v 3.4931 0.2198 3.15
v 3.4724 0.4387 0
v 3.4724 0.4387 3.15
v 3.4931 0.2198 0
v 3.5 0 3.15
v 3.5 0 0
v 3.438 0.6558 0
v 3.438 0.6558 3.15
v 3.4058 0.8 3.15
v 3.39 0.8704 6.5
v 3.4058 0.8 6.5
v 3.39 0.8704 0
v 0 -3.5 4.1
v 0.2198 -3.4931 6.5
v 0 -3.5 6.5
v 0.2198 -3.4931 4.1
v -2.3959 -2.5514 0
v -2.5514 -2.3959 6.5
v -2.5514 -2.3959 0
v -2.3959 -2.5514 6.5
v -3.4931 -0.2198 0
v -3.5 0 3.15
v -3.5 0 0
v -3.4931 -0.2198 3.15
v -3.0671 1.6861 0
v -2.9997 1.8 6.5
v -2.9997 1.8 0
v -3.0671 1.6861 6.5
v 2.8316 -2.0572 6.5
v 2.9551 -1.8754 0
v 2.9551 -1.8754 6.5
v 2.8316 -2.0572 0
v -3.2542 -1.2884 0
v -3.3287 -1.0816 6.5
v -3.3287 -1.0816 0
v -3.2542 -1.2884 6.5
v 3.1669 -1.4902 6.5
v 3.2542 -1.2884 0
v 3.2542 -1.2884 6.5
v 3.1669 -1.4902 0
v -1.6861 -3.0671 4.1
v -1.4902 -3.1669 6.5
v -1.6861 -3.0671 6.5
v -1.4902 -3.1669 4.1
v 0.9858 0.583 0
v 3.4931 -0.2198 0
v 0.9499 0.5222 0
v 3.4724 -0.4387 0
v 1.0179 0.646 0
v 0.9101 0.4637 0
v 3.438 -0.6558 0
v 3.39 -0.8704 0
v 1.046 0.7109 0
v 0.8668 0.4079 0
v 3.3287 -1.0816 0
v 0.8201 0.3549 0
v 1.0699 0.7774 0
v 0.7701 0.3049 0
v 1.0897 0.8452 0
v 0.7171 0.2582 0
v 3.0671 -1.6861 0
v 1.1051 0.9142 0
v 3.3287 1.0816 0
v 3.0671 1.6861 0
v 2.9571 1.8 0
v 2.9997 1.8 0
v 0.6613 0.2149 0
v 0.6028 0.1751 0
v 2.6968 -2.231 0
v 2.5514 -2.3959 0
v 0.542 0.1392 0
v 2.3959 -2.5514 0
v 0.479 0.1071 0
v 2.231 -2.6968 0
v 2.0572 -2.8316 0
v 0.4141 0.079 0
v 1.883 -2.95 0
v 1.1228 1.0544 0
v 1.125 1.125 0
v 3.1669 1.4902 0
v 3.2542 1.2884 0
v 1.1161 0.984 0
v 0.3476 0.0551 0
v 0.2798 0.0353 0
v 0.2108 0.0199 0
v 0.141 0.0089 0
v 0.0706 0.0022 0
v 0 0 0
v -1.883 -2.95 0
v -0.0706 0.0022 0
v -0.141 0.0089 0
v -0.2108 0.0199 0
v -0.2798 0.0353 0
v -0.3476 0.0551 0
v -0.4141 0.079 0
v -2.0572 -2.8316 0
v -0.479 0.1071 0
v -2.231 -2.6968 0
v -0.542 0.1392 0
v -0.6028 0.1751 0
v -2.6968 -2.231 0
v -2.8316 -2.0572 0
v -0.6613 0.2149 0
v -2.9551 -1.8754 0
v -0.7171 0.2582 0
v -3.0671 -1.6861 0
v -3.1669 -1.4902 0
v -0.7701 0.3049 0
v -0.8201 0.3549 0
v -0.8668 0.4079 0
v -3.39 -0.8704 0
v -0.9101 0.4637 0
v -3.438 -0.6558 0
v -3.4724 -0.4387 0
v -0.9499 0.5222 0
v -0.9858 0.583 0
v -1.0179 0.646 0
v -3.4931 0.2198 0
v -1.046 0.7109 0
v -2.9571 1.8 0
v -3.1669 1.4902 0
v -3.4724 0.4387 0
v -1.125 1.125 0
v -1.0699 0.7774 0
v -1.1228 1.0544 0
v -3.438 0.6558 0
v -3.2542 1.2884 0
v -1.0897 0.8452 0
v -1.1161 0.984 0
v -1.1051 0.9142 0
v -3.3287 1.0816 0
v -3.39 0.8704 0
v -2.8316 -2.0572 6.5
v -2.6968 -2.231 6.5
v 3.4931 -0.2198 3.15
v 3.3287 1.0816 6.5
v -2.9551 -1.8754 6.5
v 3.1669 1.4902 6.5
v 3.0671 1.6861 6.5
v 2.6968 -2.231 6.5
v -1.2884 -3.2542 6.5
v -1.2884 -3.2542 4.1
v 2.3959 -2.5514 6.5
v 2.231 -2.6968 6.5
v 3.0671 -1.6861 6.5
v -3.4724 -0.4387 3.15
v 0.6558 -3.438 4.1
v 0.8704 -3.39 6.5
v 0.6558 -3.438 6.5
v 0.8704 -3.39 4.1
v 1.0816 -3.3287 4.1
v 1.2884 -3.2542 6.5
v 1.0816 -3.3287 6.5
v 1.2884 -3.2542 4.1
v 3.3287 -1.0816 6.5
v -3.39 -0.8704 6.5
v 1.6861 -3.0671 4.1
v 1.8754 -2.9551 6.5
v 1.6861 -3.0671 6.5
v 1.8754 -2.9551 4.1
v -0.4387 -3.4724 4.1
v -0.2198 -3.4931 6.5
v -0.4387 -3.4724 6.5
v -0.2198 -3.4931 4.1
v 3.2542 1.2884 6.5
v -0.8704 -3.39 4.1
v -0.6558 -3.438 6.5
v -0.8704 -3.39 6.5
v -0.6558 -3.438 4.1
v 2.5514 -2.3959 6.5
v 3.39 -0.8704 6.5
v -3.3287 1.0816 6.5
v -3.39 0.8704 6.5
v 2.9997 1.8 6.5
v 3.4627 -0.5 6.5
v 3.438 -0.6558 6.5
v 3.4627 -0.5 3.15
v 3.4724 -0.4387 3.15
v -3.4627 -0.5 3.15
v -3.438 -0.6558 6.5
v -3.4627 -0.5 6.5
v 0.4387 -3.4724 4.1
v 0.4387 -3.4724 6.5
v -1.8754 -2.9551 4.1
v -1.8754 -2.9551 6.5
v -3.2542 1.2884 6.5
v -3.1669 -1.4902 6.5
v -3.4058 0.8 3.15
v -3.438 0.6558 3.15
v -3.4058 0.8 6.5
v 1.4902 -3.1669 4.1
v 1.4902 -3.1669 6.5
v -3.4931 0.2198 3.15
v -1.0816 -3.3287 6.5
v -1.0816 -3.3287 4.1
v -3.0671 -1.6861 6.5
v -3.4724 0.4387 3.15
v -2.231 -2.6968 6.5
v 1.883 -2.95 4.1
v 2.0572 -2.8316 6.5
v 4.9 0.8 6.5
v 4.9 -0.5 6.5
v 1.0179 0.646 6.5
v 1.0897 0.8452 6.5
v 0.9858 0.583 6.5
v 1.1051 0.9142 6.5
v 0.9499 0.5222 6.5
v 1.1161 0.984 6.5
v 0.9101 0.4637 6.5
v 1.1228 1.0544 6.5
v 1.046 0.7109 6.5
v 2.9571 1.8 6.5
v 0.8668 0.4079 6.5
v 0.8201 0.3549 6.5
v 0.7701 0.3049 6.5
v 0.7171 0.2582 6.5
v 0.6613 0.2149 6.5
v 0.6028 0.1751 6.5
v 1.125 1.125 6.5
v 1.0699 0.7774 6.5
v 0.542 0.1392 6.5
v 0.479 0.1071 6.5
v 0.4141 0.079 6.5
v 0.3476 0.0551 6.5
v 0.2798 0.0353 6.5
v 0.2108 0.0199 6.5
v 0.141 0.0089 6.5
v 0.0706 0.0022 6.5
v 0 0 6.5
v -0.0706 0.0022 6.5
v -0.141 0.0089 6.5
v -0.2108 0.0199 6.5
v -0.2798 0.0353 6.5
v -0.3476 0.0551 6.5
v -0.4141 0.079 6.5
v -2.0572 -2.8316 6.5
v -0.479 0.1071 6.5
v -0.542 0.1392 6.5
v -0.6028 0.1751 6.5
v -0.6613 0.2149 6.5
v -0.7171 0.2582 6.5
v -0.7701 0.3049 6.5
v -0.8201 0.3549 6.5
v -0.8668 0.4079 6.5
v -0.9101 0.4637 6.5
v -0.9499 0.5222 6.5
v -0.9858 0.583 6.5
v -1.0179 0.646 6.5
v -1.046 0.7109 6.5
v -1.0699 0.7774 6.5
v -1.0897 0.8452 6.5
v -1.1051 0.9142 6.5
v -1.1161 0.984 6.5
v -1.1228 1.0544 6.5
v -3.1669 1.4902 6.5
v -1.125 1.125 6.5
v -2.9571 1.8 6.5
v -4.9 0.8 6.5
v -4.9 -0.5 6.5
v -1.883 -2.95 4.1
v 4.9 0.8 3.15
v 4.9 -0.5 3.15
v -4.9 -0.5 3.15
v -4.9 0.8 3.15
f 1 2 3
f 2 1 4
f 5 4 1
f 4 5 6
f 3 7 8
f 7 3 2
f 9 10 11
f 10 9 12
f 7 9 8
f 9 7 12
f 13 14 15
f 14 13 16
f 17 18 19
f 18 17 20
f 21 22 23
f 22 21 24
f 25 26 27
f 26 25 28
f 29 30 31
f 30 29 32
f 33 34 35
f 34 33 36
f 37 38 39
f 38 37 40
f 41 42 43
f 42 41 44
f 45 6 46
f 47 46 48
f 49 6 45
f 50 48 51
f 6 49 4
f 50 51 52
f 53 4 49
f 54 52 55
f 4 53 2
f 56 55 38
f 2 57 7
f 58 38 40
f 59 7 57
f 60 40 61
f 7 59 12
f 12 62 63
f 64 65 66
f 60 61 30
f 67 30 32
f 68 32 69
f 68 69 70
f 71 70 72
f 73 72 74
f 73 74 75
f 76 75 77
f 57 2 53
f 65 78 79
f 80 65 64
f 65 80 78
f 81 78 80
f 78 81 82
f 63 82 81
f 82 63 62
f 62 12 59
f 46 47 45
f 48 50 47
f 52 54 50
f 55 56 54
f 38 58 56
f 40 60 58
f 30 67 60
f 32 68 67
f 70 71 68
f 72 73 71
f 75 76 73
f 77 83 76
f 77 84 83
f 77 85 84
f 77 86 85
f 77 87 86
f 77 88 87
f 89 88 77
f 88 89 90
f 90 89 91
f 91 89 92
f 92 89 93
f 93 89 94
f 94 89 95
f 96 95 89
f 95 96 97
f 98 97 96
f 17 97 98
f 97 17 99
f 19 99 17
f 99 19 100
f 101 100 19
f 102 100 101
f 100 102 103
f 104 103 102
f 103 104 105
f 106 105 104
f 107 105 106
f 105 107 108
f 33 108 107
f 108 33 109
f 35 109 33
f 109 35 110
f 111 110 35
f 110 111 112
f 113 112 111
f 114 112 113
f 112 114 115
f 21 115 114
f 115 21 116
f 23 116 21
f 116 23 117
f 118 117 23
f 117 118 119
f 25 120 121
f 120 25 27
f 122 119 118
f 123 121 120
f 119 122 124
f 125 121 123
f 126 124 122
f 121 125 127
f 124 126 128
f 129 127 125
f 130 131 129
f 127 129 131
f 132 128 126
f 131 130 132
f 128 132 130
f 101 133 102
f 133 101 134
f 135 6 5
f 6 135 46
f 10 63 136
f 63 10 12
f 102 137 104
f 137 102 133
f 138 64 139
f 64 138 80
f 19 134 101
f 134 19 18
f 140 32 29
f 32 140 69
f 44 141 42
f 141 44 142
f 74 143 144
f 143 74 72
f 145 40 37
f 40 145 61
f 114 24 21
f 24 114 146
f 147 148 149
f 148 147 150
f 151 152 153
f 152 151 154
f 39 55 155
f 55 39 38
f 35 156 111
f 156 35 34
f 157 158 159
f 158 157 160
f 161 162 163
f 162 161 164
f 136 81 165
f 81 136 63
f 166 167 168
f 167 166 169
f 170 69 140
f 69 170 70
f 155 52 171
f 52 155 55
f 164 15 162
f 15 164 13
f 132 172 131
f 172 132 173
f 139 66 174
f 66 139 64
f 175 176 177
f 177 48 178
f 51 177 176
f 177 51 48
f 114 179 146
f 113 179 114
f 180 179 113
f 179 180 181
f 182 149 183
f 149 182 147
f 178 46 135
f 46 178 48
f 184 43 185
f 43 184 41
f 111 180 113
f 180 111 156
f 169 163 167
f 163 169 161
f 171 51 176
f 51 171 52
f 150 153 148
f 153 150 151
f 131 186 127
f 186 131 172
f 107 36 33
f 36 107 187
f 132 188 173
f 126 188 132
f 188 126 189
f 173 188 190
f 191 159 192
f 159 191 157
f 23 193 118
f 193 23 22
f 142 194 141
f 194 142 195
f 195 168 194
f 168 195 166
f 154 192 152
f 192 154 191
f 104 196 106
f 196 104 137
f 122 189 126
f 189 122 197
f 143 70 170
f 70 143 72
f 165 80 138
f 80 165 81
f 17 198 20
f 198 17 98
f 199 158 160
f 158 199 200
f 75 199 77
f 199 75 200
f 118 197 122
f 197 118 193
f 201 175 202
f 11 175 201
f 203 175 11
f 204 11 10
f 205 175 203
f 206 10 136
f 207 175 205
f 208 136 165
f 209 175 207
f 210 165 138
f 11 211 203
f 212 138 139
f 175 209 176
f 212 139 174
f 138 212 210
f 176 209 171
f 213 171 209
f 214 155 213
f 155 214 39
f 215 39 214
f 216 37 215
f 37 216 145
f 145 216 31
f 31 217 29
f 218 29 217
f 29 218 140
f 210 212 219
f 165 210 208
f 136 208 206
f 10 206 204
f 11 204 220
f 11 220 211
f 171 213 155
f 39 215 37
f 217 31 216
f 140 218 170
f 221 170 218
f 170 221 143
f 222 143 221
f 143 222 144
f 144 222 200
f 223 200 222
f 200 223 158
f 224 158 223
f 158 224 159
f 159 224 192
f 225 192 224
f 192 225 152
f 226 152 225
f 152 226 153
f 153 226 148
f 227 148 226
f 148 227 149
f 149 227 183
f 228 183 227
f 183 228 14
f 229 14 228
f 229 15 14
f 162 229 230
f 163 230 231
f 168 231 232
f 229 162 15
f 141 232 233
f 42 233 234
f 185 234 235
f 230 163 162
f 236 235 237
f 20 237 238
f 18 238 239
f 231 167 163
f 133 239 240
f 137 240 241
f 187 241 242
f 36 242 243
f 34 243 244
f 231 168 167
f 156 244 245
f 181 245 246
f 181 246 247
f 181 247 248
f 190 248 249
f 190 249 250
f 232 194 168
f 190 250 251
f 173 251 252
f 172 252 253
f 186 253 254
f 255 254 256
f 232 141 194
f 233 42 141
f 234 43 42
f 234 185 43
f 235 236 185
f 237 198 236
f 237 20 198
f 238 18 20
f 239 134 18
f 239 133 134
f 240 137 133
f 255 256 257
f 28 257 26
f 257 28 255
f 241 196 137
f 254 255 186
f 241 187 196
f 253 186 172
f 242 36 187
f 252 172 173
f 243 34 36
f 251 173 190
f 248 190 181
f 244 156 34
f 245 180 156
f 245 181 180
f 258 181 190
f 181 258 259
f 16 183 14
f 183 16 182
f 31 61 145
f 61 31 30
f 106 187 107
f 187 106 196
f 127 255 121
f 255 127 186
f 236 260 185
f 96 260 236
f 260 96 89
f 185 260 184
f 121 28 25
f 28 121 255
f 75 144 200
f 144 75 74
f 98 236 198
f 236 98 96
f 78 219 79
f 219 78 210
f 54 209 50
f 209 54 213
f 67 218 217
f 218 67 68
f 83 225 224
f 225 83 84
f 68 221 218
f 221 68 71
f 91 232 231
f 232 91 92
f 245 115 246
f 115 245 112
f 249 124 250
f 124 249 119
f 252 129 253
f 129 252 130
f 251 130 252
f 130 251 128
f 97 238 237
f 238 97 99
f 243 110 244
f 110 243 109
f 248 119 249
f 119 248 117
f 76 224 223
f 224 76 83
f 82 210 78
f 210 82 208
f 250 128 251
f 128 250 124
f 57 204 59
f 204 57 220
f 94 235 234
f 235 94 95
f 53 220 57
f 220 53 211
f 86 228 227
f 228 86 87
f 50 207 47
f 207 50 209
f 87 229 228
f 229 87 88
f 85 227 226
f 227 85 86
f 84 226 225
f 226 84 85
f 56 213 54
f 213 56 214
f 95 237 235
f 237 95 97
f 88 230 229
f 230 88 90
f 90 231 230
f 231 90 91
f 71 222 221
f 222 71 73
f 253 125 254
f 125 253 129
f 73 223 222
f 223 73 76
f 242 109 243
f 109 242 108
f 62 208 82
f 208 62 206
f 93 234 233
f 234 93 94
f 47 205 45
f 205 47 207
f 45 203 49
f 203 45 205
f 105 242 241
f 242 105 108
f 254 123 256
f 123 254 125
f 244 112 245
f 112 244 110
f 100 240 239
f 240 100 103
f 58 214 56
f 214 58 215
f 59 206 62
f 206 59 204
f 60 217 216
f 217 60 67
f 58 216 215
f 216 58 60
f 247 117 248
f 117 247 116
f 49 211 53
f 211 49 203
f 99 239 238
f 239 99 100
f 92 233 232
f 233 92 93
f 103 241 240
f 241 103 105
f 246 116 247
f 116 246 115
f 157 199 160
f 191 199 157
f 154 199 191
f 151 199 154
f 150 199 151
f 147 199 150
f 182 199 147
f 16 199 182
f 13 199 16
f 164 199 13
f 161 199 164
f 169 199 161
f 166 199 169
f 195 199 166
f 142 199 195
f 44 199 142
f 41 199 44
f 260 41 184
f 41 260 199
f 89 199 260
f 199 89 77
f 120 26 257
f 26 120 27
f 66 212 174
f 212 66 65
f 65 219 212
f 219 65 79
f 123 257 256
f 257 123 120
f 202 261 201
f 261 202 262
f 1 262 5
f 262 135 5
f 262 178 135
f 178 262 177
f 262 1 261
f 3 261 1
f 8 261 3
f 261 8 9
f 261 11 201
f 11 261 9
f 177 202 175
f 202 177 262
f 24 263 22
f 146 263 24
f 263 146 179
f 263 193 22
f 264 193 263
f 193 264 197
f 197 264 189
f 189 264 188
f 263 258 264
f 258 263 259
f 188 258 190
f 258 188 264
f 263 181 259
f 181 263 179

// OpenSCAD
$fn=100;

base_length = 6.5;
total_width = 9.8;
tab_length = 3.35;
tab_thickness = 1.3;
outer_diameter = 7;
inner_diameter = 2.25;

difference() {
    cylinder(h=base_length, d1=outer_diameter, d2=outer_diameter, center=false);
    translate([0, 2.25/2, -0.1])
        cylinder(h=6.9, d1=inner_diameter, d2=inner_diameter, center=false);
    translate([-5, -1-4.8+(3.5/2), -0.1])
        cube([10, 1.1, 4.2], center=false);
    translate([-5, +5.3-3.5, -0.1])
        cube([10, 10, 10], center=false);
    hull() {
        translate([-inner_diameter/2, inner_diameter/2, -0.1])
            cube([inner_diameter, 3, 10], center=false);
        translate([-7/2, 2, -0.1])
            cube([7, 2, 10], center=false);
    }
}
translate([(total_width/2)-2, (-outer_diameter/2)+3, base_length-tab_length])
    cube([2, tab_thickness, tab_length], center=false);
translate([-(total_width/2), (-outer_diameter/2)+3, base_length-tab_length])
    cube([2, tab_thickness, tab_length], center=false);
